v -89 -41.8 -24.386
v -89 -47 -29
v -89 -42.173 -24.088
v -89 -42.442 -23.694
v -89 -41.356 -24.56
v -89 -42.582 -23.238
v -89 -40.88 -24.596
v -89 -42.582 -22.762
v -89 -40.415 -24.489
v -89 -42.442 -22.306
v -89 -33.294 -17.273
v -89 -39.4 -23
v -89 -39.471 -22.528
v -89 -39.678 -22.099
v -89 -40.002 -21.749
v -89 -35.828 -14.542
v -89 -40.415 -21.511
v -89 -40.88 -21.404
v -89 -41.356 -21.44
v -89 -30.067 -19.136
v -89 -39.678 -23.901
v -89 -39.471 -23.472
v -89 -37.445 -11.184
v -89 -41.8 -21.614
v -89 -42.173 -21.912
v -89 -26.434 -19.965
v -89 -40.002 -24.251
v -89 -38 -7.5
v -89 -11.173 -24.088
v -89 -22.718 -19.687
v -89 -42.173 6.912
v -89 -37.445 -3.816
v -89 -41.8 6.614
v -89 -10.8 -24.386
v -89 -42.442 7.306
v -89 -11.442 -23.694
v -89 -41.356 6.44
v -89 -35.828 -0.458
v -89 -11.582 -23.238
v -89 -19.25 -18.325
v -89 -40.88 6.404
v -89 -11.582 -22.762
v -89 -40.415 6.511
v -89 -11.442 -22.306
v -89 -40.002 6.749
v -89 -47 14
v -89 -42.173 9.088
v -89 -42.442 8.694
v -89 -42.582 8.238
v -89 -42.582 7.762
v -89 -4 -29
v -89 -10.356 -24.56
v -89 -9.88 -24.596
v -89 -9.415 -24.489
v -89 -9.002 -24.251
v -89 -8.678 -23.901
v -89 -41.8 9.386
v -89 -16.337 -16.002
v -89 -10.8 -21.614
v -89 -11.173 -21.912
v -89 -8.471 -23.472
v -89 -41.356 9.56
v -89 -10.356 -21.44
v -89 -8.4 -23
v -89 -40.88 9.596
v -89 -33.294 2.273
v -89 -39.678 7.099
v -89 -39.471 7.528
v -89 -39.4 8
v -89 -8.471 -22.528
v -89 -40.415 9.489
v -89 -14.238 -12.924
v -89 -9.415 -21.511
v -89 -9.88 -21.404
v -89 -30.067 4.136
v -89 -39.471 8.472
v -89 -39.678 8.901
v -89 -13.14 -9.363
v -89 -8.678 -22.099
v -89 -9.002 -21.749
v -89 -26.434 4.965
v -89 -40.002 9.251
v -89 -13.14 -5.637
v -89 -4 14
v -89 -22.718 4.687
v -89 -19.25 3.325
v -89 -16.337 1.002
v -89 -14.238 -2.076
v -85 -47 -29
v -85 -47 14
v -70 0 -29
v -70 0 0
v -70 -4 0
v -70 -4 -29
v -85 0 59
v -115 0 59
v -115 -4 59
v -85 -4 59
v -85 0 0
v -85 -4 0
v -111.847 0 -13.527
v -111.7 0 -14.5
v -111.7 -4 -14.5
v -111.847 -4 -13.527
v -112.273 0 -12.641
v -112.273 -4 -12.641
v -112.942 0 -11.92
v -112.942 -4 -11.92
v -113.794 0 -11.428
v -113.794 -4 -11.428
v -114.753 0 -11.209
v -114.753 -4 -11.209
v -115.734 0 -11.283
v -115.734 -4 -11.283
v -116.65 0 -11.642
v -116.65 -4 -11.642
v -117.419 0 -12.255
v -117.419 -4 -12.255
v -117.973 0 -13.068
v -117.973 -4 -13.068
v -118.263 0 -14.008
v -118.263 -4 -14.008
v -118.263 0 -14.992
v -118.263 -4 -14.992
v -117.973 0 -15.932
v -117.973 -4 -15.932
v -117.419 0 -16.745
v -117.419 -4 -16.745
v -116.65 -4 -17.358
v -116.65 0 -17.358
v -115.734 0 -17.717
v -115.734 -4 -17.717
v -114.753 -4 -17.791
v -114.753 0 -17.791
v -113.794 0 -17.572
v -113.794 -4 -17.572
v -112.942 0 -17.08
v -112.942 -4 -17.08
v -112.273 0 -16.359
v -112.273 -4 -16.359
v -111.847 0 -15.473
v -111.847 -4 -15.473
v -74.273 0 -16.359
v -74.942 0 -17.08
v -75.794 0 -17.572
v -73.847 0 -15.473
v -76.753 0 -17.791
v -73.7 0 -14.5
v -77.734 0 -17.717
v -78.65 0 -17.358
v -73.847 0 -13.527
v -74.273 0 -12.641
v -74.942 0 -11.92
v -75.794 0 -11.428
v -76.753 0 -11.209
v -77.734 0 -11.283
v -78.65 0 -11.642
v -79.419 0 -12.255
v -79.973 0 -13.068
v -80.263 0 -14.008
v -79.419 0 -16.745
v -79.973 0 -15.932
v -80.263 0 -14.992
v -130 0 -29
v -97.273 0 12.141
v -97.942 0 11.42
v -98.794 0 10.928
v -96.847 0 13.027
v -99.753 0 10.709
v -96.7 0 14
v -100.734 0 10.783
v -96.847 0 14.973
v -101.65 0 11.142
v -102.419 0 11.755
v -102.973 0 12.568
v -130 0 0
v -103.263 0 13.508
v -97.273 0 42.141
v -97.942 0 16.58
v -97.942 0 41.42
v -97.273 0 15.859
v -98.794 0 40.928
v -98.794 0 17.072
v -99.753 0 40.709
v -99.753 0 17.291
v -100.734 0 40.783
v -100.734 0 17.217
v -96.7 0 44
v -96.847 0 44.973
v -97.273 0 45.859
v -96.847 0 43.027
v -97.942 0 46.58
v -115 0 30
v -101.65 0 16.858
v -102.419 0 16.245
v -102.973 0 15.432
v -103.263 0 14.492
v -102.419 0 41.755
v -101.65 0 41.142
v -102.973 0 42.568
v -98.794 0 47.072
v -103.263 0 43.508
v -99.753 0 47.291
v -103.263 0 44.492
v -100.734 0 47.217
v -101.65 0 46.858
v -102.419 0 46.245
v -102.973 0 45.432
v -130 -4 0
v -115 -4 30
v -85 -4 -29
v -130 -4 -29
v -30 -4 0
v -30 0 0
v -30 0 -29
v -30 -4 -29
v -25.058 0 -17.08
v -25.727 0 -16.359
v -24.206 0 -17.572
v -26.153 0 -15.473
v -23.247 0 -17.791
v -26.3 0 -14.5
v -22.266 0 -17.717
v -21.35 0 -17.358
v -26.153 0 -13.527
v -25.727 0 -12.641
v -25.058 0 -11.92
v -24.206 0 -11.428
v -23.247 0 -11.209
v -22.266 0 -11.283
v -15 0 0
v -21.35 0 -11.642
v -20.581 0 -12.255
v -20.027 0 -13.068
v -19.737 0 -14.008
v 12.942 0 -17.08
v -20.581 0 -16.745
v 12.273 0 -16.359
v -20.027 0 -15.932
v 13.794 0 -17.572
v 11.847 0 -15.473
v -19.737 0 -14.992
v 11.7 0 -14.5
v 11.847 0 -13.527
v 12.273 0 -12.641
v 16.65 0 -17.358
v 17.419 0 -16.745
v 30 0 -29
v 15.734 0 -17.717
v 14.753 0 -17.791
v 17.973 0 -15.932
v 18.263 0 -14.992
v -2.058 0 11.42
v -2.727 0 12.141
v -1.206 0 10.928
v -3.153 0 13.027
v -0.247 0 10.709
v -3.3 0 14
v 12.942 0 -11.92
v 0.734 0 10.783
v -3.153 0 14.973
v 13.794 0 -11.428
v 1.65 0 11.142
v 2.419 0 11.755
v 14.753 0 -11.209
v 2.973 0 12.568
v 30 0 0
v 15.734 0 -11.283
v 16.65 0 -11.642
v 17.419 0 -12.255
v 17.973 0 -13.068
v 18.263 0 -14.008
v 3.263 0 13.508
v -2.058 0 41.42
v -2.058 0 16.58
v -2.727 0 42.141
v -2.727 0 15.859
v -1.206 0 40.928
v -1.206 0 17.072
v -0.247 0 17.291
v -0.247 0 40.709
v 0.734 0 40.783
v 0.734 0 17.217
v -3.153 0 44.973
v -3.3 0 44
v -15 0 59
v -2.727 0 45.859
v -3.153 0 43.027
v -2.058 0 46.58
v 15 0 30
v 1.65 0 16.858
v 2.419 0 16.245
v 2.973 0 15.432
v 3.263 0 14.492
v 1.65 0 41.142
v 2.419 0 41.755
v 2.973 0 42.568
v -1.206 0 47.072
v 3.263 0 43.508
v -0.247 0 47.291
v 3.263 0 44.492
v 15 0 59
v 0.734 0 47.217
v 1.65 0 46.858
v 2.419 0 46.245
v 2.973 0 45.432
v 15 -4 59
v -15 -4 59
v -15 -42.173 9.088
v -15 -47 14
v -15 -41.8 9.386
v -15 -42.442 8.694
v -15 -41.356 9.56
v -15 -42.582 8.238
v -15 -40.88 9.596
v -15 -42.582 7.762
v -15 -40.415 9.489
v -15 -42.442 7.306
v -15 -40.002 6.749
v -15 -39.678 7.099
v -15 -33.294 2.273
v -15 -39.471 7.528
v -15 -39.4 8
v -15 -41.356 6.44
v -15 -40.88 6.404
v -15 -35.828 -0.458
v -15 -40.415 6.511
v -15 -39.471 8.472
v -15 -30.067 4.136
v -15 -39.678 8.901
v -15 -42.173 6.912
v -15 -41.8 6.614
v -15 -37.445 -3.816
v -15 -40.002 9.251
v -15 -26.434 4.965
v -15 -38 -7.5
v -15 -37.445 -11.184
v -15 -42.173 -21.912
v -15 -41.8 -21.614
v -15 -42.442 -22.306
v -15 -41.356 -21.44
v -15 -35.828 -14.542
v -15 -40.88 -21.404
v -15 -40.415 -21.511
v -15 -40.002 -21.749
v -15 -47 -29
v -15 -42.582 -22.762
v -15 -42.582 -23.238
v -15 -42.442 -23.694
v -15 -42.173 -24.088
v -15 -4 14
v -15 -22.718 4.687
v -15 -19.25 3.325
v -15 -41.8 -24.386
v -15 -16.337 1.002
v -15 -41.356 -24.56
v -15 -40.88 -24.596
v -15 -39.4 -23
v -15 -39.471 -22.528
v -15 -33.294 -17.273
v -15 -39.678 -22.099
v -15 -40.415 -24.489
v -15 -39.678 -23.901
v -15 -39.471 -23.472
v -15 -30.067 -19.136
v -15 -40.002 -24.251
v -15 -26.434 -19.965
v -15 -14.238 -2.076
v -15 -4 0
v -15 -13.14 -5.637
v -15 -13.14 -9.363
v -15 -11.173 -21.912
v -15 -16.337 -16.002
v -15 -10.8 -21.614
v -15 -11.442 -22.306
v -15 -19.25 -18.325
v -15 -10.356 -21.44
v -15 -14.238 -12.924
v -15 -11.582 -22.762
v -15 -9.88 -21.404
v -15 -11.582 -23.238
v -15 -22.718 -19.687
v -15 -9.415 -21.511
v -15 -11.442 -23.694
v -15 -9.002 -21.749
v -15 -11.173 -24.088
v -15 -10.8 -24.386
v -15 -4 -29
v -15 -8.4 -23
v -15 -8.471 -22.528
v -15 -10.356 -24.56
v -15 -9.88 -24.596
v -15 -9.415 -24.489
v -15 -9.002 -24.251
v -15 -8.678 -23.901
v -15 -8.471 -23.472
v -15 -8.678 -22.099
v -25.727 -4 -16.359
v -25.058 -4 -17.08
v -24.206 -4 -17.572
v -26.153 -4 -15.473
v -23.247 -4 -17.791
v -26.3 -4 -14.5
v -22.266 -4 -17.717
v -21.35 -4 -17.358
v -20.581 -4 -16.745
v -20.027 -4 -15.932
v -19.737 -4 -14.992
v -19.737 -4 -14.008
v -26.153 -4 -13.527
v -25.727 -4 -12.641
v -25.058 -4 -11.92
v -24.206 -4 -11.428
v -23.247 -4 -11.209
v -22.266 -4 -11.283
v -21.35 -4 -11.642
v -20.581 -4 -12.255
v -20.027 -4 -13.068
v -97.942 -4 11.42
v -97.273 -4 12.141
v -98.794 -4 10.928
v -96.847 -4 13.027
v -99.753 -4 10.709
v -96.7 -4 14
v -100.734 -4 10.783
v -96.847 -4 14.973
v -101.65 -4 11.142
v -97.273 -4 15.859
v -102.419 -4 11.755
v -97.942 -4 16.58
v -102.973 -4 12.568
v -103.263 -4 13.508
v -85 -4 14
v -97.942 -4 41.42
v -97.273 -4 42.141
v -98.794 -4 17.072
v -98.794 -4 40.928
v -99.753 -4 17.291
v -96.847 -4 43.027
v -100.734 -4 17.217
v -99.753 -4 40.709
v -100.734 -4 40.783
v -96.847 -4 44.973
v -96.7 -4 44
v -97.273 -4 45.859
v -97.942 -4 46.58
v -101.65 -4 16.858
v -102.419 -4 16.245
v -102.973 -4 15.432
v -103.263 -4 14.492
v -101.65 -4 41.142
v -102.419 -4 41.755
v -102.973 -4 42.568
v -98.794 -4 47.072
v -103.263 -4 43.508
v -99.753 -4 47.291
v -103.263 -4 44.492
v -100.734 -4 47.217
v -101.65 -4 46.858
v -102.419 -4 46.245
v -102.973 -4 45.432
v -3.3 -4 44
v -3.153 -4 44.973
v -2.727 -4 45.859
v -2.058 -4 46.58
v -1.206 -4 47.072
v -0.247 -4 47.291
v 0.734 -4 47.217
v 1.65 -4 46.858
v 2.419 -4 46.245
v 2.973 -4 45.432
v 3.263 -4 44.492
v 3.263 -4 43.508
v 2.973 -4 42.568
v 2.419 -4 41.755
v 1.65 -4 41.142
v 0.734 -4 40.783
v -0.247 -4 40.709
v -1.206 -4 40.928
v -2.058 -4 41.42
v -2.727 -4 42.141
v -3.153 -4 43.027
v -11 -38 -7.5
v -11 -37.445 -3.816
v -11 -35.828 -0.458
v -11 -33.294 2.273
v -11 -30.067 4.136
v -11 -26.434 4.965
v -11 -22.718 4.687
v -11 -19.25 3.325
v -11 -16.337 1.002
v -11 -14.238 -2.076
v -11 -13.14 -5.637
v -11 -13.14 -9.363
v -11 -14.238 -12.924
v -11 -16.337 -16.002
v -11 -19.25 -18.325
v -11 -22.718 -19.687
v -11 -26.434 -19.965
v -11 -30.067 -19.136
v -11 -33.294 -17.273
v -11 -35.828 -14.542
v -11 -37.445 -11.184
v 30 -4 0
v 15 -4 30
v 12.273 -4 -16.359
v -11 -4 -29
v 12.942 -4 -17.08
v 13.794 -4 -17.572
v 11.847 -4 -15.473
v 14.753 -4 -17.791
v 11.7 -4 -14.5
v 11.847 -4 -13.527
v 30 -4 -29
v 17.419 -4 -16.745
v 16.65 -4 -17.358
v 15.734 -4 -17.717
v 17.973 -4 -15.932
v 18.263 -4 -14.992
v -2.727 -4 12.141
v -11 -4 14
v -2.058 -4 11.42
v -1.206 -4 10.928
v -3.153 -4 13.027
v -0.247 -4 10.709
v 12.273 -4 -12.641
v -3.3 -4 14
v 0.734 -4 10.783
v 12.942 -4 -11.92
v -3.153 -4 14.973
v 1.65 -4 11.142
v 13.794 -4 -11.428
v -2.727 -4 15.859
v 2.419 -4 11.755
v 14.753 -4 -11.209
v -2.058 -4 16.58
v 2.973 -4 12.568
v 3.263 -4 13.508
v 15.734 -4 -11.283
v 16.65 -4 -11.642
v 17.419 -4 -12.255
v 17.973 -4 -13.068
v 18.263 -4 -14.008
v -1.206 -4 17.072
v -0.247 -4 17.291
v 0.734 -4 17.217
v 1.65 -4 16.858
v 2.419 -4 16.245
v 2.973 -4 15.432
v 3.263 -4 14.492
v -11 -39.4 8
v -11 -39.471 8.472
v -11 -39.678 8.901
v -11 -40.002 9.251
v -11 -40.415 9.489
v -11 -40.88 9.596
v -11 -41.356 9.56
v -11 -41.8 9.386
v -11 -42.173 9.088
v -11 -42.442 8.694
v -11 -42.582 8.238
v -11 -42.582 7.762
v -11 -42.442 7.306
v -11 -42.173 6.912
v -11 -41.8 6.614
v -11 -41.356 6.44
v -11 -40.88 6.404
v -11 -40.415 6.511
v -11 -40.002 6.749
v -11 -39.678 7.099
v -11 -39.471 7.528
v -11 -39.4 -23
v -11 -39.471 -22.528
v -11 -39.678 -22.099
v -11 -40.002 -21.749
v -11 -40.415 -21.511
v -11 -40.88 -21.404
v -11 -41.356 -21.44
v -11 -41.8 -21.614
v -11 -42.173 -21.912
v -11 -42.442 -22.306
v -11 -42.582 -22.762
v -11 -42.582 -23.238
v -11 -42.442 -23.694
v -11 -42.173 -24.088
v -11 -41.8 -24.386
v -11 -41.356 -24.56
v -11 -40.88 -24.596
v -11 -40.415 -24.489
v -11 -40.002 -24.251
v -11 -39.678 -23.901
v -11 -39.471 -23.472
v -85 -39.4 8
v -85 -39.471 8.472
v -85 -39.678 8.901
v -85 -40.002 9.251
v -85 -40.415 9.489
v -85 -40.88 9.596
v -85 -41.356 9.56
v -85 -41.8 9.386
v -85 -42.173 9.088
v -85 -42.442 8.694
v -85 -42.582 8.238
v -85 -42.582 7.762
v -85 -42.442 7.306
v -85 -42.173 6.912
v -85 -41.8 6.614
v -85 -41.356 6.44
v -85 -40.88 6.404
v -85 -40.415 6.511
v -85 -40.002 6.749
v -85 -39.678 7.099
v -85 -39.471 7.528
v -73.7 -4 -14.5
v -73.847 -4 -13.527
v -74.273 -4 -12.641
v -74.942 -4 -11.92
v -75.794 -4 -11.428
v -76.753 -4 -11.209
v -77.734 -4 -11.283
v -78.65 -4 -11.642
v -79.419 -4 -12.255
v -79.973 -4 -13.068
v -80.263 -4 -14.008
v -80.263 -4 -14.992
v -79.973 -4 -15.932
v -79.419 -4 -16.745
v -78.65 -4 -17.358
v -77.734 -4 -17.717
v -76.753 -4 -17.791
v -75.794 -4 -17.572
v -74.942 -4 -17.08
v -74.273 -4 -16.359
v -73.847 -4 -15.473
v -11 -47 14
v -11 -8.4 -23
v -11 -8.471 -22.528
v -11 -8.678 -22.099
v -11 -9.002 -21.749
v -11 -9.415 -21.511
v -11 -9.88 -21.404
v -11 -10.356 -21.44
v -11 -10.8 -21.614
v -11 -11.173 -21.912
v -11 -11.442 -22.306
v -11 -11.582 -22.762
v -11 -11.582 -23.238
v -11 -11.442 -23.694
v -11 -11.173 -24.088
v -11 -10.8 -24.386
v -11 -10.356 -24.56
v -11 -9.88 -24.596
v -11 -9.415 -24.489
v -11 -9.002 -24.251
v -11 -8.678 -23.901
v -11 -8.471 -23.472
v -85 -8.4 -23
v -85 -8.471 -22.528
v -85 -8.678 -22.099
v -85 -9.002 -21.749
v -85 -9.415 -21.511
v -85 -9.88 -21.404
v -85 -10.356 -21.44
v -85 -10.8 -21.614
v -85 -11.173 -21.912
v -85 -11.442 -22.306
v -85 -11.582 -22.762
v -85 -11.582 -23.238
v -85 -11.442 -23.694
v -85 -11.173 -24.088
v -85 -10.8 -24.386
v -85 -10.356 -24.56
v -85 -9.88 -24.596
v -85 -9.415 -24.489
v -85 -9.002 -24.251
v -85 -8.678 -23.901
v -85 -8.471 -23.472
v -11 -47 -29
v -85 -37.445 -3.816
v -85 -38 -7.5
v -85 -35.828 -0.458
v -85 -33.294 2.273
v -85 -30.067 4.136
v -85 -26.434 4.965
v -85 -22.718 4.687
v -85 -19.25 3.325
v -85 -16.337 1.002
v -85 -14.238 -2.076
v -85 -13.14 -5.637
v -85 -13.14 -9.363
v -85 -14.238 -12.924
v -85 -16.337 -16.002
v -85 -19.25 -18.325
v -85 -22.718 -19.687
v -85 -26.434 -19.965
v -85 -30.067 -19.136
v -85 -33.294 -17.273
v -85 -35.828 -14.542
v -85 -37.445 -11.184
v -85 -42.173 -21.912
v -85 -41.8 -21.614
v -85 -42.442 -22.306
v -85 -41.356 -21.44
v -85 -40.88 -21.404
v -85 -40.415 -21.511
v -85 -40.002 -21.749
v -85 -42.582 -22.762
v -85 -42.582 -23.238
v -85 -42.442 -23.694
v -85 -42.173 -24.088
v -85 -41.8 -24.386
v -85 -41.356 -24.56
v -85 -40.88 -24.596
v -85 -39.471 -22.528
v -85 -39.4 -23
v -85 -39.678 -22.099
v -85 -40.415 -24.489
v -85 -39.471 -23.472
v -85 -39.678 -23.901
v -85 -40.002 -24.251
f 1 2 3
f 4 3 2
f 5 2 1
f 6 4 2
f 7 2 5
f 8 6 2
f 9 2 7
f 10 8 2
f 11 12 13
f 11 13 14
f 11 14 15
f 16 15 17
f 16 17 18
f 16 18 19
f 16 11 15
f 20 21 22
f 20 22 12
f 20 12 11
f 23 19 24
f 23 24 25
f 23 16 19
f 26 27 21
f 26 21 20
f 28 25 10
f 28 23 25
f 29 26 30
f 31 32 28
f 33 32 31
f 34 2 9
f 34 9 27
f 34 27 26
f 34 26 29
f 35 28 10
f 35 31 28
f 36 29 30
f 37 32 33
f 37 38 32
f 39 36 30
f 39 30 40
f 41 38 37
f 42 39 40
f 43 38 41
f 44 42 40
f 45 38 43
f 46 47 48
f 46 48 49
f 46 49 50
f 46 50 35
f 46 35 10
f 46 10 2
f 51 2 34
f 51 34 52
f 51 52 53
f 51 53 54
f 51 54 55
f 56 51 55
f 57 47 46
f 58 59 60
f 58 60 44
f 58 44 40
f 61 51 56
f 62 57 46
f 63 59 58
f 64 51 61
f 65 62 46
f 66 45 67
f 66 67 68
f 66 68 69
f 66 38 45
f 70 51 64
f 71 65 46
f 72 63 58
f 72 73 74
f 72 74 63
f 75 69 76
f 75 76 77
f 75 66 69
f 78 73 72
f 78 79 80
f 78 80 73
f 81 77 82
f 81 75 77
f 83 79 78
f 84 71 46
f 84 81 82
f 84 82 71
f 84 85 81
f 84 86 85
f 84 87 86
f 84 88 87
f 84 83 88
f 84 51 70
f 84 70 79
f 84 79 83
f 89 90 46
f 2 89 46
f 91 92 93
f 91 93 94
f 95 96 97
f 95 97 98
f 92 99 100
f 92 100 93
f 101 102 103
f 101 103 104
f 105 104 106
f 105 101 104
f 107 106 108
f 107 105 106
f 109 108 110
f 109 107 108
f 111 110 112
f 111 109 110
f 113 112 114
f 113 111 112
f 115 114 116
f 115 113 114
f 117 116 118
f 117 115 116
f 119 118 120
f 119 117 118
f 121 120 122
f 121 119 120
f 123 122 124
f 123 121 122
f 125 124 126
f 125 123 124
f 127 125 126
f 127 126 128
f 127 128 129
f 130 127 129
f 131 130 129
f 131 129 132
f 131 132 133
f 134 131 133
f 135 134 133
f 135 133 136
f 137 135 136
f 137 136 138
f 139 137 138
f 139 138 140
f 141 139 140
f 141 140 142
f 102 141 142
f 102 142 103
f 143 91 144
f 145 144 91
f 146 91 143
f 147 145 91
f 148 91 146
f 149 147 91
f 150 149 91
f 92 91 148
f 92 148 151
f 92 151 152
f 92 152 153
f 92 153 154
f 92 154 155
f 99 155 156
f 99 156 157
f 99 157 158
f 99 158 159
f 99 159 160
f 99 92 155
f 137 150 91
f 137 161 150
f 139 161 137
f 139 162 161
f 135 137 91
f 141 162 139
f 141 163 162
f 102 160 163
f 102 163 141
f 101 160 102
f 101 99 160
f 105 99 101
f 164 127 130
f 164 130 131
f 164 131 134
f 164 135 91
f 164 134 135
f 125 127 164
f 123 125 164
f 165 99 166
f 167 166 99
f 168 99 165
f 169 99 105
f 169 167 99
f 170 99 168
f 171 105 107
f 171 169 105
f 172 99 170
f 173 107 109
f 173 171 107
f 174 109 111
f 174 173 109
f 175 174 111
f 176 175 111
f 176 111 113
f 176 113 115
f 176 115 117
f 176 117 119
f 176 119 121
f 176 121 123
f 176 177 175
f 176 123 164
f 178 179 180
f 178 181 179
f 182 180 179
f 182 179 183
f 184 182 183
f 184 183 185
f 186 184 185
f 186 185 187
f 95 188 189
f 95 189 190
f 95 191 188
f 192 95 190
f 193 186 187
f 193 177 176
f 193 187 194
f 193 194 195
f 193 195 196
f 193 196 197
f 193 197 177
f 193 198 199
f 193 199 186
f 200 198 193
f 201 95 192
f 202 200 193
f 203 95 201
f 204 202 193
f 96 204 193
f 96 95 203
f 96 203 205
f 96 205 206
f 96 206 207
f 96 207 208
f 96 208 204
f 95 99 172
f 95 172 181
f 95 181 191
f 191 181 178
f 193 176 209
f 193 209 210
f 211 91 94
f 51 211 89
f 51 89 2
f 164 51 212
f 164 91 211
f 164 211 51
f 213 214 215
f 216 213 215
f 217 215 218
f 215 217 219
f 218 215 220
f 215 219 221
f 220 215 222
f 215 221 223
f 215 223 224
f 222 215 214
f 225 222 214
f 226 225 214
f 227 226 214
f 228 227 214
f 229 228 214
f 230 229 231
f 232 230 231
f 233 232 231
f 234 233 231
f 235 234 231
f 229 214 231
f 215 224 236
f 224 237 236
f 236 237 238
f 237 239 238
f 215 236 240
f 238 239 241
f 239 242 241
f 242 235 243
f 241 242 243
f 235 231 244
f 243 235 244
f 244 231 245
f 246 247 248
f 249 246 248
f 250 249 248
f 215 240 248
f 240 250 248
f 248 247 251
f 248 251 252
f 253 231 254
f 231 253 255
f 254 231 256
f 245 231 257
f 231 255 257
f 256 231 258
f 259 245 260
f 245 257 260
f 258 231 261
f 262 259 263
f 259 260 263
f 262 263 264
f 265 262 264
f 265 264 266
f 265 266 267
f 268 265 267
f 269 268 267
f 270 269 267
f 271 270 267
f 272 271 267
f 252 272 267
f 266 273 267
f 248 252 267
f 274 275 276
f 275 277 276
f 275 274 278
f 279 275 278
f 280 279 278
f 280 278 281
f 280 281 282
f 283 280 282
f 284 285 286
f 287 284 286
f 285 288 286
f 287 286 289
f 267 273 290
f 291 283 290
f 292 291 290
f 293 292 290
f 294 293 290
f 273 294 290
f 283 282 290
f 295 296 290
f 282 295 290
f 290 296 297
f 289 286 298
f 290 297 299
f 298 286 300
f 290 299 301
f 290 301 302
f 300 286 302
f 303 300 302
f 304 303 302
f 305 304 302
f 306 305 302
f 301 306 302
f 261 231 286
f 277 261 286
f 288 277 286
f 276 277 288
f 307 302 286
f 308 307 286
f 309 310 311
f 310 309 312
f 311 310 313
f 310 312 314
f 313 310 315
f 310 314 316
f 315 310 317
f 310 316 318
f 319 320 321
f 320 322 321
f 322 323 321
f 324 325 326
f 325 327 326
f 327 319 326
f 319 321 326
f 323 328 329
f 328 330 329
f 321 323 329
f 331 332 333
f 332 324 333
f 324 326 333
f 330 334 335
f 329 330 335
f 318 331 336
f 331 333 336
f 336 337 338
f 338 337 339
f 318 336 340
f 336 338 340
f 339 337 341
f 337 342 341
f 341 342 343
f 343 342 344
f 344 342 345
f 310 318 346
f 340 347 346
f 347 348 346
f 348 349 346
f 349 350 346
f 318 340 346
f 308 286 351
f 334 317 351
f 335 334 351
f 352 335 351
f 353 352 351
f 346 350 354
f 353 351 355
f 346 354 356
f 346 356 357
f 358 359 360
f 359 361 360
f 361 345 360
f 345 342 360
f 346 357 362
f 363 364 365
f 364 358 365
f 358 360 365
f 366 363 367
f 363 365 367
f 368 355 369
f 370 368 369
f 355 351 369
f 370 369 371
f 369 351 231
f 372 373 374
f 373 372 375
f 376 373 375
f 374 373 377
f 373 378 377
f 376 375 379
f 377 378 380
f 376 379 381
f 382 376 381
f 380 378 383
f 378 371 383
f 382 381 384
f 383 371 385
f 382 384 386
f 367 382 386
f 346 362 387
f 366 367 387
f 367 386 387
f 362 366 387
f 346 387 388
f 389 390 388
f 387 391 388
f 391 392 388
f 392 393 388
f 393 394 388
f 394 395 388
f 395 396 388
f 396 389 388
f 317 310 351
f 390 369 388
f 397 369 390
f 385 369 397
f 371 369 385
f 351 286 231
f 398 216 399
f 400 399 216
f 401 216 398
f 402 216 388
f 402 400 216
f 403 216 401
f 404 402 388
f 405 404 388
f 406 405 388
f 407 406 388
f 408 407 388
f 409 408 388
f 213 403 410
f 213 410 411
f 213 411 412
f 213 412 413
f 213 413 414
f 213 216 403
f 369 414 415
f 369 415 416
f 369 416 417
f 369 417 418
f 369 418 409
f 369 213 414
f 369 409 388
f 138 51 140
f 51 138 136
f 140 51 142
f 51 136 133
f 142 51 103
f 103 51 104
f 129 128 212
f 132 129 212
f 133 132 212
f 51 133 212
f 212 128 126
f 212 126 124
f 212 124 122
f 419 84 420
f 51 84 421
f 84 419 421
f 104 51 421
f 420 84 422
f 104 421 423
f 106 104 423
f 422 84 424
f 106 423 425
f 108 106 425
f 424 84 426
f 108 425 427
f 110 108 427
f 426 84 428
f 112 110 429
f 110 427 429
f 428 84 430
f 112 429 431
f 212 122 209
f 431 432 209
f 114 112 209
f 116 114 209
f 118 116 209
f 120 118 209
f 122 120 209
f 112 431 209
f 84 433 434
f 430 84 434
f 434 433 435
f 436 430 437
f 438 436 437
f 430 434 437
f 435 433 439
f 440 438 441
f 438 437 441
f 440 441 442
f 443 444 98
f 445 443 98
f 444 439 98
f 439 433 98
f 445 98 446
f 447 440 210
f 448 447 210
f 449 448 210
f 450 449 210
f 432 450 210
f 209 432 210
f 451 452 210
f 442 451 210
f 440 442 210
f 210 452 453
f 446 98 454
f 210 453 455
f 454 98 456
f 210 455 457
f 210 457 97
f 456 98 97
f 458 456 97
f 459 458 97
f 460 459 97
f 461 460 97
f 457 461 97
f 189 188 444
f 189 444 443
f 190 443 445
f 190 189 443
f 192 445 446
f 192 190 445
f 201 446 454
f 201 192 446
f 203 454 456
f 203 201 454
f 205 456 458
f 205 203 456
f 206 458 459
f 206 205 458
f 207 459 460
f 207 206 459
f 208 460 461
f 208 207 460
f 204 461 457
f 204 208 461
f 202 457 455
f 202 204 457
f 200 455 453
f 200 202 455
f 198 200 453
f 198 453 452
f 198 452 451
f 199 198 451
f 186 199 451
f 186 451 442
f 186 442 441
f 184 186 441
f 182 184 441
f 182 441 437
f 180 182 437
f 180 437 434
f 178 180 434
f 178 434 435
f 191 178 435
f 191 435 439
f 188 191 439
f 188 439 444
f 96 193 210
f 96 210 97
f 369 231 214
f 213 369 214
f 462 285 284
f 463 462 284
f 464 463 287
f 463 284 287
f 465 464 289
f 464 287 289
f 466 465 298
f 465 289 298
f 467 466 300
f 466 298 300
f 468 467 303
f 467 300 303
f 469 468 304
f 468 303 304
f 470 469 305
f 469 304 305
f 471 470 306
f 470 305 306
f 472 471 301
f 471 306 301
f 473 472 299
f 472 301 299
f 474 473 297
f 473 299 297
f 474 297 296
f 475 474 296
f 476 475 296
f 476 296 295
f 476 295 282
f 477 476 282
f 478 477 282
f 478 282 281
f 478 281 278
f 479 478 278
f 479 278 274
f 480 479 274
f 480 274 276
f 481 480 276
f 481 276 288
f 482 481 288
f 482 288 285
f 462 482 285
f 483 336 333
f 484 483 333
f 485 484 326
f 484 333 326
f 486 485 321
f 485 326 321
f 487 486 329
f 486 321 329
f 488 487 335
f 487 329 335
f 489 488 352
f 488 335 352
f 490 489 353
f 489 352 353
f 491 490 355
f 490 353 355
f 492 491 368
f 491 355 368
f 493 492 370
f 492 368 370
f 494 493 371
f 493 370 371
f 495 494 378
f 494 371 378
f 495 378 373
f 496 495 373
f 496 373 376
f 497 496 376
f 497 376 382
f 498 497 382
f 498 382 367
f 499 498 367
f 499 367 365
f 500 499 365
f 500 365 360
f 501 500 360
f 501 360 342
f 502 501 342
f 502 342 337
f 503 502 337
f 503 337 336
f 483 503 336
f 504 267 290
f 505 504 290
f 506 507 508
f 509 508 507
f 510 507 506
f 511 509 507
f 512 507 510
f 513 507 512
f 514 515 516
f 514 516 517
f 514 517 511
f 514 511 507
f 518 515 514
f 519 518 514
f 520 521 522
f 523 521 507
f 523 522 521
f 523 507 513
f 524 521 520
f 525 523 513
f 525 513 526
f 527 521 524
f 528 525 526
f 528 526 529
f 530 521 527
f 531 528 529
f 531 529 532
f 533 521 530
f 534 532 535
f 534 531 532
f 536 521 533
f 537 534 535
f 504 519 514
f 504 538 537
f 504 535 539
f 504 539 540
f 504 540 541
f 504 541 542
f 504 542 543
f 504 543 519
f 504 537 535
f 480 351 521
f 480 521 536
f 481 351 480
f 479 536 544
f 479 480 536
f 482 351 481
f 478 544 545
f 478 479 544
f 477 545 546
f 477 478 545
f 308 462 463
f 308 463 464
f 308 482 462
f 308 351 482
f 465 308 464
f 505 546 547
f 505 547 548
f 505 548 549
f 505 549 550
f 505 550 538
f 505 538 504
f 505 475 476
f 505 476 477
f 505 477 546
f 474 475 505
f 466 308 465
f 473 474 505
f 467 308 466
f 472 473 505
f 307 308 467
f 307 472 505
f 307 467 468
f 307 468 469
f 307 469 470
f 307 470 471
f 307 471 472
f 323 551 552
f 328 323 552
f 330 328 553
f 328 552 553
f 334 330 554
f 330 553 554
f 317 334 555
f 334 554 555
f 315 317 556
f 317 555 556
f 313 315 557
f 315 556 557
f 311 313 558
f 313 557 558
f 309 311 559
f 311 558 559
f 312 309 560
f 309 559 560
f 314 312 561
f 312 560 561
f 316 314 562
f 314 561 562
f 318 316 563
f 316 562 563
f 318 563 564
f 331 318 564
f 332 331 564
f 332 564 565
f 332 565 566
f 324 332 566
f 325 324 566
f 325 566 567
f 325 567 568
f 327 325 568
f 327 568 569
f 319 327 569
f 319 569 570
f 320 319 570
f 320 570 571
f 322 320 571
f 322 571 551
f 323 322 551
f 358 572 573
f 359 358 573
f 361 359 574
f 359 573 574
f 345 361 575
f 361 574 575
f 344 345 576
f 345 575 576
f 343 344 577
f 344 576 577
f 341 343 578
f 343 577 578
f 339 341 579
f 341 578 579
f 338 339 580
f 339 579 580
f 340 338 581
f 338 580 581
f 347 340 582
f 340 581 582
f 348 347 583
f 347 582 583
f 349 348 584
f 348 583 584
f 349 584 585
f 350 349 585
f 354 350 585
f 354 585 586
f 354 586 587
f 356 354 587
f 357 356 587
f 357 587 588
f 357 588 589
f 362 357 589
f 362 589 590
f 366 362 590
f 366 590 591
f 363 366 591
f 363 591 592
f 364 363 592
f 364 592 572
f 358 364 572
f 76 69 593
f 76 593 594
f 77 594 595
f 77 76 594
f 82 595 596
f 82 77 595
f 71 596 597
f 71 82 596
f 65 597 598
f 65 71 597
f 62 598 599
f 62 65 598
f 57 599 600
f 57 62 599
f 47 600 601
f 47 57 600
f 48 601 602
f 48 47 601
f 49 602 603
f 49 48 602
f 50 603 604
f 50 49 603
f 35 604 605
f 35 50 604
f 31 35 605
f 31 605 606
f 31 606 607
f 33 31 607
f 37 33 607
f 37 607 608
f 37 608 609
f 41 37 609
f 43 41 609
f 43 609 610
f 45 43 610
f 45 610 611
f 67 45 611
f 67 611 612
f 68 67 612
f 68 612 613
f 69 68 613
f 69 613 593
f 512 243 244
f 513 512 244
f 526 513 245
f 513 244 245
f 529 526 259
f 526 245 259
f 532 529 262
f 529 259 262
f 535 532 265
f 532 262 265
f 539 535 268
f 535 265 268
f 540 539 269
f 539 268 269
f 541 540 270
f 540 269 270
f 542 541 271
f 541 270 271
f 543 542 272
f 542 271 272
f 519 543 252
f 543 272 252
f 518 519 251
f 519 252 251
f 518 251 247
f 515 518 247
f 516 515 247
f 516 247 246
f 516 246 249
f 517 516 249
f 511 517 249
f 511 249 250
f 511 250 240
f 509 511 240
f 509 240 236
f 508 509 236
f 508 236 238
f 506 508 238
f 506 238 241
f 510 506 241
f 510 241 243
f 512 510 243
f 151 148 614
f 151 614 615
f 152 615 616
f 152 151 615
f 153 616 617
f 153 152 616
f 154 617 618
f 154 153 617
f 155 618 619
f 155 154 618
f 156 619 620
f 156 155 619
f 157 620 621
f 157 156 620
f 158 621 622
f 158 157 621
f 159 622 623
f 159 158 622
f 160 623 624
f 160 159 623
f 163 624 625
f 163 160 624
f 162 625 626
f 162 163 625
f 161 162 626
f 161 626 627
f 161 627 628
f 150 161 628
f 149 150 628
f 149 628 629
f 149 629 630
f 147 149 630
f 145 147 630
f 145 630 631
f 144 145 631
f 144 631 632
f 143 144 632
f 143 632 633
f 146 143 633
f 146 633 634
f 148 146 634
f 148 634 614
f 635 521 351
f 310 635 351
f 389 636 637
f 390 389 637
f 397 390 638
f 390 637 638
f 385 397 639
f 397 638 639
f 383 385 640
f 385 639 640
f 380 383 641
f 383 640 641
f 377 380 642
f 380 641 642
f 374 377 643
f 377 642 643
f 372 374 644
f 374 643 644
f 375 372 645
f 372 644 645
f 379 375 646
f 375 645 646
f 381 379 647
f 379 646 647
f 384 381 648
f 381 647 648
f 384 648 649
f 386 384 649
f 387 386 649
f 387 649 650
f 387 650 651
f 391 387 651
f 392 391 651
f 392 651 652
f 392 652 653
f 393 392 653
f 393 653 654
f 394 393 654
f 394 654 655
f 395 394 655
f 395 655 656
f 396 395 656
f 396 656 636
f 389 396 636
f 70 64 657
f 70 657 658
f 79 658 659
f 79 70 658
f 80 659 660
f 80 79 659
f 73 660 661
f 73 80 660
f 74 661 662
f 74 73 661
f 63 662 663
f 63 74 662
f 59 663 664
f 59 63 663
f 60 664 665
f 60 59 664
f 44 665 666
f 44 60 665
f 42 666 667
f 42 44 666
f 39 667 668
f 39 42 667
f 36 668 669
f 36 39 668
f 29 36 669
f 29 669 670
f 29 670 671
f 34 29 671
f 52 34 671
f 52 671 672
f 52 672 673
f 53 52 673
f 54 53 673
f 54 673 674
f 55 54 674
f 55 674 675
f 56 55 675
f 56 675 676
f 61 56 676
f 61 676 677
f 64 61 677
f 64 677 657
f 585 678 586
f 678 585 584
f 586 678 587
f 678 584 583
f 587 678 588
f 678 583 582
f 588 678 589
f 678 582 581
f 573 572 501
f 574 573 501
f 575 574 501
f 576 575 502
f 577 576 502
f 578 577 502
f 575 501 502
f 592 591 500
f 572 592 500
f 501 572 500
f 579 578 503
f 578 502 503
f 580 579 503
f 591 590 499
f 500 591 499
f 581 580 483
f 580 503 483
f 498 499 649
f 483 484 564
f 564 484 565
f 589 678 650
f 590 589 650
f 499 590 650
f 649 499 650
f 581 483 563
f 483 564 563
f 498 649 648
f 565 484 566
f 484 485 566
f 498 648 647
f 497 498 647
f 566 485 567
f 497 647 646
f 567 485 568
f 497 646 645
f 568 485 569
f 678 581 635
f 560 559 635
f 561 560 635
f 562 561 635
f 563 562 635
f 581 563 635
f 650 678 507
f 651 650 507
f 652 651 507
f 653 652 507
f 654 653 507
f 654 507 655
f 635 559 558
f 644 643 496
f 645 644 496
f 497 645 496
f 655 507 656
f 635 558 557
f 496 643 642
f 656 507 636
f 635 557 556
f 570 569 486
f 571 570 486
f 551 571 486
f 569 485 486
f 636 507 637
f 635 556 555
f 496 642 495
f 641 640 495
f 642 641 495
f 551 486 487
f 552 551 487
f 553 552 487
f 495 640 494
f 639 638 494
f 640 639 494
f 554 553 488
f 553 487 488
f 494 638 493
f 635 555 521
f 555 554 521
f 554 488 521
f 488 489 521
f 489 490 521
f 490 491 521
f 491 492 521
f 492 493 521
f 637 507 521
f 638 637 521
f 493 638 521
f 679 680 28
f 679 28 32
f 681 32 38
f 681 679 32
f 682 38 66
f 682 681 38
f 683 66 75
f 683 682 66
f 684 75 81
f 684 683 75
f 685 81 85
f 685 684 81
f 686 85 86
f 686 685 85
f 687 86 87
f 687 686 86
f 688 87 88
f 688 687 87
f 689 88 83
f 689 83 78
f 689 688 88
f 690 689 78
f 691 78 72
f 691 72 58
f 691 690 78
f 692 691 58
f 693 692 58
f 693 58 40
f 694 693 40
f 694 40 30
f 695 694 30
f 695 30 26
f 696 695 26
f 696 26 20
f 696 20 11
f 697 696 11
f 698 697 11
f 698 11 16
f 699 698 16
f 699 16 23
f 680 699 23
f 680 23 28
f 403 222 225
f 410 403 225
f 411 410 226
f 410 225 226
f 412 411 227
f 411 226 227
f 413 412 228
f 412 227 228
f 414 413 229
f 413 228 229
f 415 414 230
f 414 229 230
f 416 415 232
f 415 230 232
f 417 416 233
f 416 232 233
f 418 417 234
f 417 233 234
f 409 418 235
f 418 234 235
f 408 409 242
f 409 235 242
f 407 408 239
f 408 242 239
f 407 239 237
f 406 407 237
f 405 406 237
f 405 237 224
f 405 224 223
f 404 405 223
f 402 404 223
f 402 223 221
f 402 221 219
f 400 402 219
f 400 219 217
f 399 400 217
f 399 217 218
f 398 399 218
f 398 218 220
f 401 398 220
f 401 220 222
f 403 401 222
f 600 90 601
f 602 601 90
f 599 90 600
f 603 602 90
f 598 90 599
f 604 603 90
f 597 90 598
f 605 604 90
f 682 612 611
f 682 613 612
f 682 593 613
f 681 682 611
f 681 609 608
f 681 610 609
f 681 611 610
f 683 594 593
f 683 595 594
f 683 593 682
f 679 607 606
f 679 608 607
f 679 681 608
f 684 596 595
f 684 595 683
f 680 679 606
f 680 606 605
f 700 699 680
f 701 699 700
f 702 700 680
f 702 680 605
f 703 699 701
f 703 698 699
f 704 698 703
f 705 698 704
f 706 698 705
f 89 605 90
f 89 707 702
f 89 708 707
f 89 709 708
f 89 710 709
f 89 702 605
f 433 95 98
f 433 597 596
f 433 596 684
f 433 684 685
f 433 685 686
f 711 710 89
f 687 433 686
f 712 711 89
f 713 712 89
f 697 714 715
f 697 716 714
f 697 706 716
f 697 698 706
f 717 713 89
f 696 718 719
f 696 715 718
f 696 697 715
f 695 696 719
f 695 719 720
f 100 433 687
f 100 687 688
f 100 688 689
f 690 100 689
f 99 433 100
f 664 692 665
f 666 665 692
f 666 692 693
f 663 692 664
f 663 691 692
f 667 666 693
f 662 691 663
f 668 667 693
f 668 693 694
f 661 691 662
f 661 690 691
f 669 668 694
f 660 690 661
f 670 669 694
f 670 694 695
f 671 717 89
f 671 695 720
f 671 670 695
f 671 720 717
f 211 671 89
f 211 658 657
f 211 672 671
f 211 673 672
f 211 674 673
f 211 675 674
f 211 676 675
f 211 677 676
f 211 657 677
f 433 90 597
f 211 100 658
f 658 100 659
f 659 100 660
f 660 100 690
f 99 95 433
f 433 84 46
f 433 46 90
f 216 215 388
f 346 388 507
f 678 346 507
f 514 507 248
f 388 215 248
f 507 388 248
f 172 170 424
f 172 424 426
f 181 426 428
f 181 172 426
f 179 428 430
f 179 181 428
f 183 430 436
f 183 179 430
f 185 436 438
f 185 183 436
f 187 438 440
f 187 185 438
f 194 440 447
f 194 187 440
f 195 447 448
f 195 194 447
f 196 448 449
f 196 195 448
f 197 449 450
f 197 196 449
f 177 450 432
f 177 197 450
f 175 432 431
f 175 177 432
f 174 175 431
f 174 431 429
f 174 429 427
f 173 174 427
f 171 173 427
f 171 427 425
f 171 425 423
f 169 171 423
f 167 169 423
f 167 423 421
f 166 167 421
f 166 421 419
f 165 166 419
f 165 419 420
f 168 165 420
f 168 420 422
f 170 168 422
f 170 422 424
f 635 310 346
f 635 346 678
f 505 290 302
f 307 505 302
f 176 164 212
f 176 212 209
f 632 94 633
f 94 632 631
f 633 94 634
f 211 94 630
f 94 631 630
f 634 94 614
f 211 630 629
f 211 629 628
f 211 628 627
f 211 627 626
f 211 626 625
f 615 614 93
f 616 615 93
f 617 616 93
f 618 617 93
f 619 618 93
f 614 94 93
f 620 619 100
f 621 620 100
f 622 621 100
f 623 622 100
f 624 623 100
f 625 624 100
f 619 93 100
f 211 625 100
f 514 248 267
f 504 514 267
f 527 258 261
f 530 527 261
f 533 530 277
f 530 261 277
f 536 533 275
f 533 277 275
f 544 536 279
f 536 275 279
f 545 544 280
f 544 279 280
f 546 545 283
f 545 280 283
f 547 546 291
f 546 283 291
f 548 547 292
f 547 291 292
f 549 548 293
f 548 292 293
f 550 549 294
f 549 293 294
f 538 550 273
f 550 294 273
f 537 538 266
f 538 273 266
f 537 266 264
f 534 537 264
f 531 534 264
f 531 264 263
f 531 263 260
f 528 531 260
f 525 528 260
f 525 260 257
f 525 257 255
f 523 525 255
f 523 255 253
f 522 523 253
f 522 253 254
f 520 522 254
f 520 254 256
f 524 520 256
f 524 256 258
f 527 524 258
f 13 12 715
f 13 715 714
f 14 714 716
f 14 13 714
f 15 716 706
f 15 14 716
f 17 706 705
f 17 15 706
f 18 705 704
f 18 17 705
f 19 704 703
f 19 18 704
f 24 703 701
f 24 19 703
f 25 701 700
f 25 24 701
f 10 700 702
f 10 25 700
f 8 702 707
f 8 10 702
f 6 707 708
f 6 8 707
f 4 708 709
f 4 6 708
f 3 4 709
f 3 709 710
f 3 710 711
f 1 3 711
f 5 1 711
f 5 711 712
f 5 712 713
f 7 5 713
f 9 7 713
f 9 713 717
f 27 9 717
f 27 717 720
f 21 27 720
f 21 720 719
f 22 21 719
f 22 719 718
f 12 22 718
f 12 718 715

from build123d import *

# Parameters (mm, degrees)
F1_DEPTH = 4
F3_DEPTH = 43
F4_R     = 12.5
F5_DEPTH = 45.001
F6_D     = 3.2
F8_D     = 6.6


with BuildPart() as f1:
    # F0 (on Front) → F1 (new body)
    with BuildSketch(Plane.XZ):
        Polygon((-15, 0), (-30, 0), (-30, -29), (30, -29), (30, 0), (15, 30), (15, 59), (-15, 59), align=None)
    extrude(amount=F1_DEPTH)

    # F2 (on face) → F3 (join)
    with BuildSketch(Plane.XZ.offset(4)):
        Polygon((-11, 14), (-15, 14), (-15, 0), (-15, -29), (-11, -29), align=None)
    extrude(amount=F3_DEPTH)

    # F4 (on face) → F5 (cut, through all)
    with BuildSketch(Plane(origin=(-15, 0, 0), x_dir=(0, -1, 0), z_dir=(-1, 0, 0))):
        with Locations((25.5, -7.5)):
            Circle(F4_R)
    extrude(amount=-F5_DEPTH, mode=Mode.SUBTRACT)

    # F6 (through all)
    with Locations(Plane(origin=(-15, 0, 0), x_dir=(0, -1, 0), z_dir=(-1, 0, 0))):
        with Locations((41, 8), (41, -23), (10, -23)):
            Hole(F6_D / 2)

    # F8 (through all)
    with Locations(Plane.XZ.offset(4)):
        with Locations((0, 44), (15, -14.5), (-23, -14.5), (0, 14)):
            Hole(F8_D / 2)


with BuildPart() as f11_1:
    # F11: instance of F1
    add(f1.part.mirror(Plane.YZ.offset(-50)))


solid = Compound([f1.part, f11_1.part])
